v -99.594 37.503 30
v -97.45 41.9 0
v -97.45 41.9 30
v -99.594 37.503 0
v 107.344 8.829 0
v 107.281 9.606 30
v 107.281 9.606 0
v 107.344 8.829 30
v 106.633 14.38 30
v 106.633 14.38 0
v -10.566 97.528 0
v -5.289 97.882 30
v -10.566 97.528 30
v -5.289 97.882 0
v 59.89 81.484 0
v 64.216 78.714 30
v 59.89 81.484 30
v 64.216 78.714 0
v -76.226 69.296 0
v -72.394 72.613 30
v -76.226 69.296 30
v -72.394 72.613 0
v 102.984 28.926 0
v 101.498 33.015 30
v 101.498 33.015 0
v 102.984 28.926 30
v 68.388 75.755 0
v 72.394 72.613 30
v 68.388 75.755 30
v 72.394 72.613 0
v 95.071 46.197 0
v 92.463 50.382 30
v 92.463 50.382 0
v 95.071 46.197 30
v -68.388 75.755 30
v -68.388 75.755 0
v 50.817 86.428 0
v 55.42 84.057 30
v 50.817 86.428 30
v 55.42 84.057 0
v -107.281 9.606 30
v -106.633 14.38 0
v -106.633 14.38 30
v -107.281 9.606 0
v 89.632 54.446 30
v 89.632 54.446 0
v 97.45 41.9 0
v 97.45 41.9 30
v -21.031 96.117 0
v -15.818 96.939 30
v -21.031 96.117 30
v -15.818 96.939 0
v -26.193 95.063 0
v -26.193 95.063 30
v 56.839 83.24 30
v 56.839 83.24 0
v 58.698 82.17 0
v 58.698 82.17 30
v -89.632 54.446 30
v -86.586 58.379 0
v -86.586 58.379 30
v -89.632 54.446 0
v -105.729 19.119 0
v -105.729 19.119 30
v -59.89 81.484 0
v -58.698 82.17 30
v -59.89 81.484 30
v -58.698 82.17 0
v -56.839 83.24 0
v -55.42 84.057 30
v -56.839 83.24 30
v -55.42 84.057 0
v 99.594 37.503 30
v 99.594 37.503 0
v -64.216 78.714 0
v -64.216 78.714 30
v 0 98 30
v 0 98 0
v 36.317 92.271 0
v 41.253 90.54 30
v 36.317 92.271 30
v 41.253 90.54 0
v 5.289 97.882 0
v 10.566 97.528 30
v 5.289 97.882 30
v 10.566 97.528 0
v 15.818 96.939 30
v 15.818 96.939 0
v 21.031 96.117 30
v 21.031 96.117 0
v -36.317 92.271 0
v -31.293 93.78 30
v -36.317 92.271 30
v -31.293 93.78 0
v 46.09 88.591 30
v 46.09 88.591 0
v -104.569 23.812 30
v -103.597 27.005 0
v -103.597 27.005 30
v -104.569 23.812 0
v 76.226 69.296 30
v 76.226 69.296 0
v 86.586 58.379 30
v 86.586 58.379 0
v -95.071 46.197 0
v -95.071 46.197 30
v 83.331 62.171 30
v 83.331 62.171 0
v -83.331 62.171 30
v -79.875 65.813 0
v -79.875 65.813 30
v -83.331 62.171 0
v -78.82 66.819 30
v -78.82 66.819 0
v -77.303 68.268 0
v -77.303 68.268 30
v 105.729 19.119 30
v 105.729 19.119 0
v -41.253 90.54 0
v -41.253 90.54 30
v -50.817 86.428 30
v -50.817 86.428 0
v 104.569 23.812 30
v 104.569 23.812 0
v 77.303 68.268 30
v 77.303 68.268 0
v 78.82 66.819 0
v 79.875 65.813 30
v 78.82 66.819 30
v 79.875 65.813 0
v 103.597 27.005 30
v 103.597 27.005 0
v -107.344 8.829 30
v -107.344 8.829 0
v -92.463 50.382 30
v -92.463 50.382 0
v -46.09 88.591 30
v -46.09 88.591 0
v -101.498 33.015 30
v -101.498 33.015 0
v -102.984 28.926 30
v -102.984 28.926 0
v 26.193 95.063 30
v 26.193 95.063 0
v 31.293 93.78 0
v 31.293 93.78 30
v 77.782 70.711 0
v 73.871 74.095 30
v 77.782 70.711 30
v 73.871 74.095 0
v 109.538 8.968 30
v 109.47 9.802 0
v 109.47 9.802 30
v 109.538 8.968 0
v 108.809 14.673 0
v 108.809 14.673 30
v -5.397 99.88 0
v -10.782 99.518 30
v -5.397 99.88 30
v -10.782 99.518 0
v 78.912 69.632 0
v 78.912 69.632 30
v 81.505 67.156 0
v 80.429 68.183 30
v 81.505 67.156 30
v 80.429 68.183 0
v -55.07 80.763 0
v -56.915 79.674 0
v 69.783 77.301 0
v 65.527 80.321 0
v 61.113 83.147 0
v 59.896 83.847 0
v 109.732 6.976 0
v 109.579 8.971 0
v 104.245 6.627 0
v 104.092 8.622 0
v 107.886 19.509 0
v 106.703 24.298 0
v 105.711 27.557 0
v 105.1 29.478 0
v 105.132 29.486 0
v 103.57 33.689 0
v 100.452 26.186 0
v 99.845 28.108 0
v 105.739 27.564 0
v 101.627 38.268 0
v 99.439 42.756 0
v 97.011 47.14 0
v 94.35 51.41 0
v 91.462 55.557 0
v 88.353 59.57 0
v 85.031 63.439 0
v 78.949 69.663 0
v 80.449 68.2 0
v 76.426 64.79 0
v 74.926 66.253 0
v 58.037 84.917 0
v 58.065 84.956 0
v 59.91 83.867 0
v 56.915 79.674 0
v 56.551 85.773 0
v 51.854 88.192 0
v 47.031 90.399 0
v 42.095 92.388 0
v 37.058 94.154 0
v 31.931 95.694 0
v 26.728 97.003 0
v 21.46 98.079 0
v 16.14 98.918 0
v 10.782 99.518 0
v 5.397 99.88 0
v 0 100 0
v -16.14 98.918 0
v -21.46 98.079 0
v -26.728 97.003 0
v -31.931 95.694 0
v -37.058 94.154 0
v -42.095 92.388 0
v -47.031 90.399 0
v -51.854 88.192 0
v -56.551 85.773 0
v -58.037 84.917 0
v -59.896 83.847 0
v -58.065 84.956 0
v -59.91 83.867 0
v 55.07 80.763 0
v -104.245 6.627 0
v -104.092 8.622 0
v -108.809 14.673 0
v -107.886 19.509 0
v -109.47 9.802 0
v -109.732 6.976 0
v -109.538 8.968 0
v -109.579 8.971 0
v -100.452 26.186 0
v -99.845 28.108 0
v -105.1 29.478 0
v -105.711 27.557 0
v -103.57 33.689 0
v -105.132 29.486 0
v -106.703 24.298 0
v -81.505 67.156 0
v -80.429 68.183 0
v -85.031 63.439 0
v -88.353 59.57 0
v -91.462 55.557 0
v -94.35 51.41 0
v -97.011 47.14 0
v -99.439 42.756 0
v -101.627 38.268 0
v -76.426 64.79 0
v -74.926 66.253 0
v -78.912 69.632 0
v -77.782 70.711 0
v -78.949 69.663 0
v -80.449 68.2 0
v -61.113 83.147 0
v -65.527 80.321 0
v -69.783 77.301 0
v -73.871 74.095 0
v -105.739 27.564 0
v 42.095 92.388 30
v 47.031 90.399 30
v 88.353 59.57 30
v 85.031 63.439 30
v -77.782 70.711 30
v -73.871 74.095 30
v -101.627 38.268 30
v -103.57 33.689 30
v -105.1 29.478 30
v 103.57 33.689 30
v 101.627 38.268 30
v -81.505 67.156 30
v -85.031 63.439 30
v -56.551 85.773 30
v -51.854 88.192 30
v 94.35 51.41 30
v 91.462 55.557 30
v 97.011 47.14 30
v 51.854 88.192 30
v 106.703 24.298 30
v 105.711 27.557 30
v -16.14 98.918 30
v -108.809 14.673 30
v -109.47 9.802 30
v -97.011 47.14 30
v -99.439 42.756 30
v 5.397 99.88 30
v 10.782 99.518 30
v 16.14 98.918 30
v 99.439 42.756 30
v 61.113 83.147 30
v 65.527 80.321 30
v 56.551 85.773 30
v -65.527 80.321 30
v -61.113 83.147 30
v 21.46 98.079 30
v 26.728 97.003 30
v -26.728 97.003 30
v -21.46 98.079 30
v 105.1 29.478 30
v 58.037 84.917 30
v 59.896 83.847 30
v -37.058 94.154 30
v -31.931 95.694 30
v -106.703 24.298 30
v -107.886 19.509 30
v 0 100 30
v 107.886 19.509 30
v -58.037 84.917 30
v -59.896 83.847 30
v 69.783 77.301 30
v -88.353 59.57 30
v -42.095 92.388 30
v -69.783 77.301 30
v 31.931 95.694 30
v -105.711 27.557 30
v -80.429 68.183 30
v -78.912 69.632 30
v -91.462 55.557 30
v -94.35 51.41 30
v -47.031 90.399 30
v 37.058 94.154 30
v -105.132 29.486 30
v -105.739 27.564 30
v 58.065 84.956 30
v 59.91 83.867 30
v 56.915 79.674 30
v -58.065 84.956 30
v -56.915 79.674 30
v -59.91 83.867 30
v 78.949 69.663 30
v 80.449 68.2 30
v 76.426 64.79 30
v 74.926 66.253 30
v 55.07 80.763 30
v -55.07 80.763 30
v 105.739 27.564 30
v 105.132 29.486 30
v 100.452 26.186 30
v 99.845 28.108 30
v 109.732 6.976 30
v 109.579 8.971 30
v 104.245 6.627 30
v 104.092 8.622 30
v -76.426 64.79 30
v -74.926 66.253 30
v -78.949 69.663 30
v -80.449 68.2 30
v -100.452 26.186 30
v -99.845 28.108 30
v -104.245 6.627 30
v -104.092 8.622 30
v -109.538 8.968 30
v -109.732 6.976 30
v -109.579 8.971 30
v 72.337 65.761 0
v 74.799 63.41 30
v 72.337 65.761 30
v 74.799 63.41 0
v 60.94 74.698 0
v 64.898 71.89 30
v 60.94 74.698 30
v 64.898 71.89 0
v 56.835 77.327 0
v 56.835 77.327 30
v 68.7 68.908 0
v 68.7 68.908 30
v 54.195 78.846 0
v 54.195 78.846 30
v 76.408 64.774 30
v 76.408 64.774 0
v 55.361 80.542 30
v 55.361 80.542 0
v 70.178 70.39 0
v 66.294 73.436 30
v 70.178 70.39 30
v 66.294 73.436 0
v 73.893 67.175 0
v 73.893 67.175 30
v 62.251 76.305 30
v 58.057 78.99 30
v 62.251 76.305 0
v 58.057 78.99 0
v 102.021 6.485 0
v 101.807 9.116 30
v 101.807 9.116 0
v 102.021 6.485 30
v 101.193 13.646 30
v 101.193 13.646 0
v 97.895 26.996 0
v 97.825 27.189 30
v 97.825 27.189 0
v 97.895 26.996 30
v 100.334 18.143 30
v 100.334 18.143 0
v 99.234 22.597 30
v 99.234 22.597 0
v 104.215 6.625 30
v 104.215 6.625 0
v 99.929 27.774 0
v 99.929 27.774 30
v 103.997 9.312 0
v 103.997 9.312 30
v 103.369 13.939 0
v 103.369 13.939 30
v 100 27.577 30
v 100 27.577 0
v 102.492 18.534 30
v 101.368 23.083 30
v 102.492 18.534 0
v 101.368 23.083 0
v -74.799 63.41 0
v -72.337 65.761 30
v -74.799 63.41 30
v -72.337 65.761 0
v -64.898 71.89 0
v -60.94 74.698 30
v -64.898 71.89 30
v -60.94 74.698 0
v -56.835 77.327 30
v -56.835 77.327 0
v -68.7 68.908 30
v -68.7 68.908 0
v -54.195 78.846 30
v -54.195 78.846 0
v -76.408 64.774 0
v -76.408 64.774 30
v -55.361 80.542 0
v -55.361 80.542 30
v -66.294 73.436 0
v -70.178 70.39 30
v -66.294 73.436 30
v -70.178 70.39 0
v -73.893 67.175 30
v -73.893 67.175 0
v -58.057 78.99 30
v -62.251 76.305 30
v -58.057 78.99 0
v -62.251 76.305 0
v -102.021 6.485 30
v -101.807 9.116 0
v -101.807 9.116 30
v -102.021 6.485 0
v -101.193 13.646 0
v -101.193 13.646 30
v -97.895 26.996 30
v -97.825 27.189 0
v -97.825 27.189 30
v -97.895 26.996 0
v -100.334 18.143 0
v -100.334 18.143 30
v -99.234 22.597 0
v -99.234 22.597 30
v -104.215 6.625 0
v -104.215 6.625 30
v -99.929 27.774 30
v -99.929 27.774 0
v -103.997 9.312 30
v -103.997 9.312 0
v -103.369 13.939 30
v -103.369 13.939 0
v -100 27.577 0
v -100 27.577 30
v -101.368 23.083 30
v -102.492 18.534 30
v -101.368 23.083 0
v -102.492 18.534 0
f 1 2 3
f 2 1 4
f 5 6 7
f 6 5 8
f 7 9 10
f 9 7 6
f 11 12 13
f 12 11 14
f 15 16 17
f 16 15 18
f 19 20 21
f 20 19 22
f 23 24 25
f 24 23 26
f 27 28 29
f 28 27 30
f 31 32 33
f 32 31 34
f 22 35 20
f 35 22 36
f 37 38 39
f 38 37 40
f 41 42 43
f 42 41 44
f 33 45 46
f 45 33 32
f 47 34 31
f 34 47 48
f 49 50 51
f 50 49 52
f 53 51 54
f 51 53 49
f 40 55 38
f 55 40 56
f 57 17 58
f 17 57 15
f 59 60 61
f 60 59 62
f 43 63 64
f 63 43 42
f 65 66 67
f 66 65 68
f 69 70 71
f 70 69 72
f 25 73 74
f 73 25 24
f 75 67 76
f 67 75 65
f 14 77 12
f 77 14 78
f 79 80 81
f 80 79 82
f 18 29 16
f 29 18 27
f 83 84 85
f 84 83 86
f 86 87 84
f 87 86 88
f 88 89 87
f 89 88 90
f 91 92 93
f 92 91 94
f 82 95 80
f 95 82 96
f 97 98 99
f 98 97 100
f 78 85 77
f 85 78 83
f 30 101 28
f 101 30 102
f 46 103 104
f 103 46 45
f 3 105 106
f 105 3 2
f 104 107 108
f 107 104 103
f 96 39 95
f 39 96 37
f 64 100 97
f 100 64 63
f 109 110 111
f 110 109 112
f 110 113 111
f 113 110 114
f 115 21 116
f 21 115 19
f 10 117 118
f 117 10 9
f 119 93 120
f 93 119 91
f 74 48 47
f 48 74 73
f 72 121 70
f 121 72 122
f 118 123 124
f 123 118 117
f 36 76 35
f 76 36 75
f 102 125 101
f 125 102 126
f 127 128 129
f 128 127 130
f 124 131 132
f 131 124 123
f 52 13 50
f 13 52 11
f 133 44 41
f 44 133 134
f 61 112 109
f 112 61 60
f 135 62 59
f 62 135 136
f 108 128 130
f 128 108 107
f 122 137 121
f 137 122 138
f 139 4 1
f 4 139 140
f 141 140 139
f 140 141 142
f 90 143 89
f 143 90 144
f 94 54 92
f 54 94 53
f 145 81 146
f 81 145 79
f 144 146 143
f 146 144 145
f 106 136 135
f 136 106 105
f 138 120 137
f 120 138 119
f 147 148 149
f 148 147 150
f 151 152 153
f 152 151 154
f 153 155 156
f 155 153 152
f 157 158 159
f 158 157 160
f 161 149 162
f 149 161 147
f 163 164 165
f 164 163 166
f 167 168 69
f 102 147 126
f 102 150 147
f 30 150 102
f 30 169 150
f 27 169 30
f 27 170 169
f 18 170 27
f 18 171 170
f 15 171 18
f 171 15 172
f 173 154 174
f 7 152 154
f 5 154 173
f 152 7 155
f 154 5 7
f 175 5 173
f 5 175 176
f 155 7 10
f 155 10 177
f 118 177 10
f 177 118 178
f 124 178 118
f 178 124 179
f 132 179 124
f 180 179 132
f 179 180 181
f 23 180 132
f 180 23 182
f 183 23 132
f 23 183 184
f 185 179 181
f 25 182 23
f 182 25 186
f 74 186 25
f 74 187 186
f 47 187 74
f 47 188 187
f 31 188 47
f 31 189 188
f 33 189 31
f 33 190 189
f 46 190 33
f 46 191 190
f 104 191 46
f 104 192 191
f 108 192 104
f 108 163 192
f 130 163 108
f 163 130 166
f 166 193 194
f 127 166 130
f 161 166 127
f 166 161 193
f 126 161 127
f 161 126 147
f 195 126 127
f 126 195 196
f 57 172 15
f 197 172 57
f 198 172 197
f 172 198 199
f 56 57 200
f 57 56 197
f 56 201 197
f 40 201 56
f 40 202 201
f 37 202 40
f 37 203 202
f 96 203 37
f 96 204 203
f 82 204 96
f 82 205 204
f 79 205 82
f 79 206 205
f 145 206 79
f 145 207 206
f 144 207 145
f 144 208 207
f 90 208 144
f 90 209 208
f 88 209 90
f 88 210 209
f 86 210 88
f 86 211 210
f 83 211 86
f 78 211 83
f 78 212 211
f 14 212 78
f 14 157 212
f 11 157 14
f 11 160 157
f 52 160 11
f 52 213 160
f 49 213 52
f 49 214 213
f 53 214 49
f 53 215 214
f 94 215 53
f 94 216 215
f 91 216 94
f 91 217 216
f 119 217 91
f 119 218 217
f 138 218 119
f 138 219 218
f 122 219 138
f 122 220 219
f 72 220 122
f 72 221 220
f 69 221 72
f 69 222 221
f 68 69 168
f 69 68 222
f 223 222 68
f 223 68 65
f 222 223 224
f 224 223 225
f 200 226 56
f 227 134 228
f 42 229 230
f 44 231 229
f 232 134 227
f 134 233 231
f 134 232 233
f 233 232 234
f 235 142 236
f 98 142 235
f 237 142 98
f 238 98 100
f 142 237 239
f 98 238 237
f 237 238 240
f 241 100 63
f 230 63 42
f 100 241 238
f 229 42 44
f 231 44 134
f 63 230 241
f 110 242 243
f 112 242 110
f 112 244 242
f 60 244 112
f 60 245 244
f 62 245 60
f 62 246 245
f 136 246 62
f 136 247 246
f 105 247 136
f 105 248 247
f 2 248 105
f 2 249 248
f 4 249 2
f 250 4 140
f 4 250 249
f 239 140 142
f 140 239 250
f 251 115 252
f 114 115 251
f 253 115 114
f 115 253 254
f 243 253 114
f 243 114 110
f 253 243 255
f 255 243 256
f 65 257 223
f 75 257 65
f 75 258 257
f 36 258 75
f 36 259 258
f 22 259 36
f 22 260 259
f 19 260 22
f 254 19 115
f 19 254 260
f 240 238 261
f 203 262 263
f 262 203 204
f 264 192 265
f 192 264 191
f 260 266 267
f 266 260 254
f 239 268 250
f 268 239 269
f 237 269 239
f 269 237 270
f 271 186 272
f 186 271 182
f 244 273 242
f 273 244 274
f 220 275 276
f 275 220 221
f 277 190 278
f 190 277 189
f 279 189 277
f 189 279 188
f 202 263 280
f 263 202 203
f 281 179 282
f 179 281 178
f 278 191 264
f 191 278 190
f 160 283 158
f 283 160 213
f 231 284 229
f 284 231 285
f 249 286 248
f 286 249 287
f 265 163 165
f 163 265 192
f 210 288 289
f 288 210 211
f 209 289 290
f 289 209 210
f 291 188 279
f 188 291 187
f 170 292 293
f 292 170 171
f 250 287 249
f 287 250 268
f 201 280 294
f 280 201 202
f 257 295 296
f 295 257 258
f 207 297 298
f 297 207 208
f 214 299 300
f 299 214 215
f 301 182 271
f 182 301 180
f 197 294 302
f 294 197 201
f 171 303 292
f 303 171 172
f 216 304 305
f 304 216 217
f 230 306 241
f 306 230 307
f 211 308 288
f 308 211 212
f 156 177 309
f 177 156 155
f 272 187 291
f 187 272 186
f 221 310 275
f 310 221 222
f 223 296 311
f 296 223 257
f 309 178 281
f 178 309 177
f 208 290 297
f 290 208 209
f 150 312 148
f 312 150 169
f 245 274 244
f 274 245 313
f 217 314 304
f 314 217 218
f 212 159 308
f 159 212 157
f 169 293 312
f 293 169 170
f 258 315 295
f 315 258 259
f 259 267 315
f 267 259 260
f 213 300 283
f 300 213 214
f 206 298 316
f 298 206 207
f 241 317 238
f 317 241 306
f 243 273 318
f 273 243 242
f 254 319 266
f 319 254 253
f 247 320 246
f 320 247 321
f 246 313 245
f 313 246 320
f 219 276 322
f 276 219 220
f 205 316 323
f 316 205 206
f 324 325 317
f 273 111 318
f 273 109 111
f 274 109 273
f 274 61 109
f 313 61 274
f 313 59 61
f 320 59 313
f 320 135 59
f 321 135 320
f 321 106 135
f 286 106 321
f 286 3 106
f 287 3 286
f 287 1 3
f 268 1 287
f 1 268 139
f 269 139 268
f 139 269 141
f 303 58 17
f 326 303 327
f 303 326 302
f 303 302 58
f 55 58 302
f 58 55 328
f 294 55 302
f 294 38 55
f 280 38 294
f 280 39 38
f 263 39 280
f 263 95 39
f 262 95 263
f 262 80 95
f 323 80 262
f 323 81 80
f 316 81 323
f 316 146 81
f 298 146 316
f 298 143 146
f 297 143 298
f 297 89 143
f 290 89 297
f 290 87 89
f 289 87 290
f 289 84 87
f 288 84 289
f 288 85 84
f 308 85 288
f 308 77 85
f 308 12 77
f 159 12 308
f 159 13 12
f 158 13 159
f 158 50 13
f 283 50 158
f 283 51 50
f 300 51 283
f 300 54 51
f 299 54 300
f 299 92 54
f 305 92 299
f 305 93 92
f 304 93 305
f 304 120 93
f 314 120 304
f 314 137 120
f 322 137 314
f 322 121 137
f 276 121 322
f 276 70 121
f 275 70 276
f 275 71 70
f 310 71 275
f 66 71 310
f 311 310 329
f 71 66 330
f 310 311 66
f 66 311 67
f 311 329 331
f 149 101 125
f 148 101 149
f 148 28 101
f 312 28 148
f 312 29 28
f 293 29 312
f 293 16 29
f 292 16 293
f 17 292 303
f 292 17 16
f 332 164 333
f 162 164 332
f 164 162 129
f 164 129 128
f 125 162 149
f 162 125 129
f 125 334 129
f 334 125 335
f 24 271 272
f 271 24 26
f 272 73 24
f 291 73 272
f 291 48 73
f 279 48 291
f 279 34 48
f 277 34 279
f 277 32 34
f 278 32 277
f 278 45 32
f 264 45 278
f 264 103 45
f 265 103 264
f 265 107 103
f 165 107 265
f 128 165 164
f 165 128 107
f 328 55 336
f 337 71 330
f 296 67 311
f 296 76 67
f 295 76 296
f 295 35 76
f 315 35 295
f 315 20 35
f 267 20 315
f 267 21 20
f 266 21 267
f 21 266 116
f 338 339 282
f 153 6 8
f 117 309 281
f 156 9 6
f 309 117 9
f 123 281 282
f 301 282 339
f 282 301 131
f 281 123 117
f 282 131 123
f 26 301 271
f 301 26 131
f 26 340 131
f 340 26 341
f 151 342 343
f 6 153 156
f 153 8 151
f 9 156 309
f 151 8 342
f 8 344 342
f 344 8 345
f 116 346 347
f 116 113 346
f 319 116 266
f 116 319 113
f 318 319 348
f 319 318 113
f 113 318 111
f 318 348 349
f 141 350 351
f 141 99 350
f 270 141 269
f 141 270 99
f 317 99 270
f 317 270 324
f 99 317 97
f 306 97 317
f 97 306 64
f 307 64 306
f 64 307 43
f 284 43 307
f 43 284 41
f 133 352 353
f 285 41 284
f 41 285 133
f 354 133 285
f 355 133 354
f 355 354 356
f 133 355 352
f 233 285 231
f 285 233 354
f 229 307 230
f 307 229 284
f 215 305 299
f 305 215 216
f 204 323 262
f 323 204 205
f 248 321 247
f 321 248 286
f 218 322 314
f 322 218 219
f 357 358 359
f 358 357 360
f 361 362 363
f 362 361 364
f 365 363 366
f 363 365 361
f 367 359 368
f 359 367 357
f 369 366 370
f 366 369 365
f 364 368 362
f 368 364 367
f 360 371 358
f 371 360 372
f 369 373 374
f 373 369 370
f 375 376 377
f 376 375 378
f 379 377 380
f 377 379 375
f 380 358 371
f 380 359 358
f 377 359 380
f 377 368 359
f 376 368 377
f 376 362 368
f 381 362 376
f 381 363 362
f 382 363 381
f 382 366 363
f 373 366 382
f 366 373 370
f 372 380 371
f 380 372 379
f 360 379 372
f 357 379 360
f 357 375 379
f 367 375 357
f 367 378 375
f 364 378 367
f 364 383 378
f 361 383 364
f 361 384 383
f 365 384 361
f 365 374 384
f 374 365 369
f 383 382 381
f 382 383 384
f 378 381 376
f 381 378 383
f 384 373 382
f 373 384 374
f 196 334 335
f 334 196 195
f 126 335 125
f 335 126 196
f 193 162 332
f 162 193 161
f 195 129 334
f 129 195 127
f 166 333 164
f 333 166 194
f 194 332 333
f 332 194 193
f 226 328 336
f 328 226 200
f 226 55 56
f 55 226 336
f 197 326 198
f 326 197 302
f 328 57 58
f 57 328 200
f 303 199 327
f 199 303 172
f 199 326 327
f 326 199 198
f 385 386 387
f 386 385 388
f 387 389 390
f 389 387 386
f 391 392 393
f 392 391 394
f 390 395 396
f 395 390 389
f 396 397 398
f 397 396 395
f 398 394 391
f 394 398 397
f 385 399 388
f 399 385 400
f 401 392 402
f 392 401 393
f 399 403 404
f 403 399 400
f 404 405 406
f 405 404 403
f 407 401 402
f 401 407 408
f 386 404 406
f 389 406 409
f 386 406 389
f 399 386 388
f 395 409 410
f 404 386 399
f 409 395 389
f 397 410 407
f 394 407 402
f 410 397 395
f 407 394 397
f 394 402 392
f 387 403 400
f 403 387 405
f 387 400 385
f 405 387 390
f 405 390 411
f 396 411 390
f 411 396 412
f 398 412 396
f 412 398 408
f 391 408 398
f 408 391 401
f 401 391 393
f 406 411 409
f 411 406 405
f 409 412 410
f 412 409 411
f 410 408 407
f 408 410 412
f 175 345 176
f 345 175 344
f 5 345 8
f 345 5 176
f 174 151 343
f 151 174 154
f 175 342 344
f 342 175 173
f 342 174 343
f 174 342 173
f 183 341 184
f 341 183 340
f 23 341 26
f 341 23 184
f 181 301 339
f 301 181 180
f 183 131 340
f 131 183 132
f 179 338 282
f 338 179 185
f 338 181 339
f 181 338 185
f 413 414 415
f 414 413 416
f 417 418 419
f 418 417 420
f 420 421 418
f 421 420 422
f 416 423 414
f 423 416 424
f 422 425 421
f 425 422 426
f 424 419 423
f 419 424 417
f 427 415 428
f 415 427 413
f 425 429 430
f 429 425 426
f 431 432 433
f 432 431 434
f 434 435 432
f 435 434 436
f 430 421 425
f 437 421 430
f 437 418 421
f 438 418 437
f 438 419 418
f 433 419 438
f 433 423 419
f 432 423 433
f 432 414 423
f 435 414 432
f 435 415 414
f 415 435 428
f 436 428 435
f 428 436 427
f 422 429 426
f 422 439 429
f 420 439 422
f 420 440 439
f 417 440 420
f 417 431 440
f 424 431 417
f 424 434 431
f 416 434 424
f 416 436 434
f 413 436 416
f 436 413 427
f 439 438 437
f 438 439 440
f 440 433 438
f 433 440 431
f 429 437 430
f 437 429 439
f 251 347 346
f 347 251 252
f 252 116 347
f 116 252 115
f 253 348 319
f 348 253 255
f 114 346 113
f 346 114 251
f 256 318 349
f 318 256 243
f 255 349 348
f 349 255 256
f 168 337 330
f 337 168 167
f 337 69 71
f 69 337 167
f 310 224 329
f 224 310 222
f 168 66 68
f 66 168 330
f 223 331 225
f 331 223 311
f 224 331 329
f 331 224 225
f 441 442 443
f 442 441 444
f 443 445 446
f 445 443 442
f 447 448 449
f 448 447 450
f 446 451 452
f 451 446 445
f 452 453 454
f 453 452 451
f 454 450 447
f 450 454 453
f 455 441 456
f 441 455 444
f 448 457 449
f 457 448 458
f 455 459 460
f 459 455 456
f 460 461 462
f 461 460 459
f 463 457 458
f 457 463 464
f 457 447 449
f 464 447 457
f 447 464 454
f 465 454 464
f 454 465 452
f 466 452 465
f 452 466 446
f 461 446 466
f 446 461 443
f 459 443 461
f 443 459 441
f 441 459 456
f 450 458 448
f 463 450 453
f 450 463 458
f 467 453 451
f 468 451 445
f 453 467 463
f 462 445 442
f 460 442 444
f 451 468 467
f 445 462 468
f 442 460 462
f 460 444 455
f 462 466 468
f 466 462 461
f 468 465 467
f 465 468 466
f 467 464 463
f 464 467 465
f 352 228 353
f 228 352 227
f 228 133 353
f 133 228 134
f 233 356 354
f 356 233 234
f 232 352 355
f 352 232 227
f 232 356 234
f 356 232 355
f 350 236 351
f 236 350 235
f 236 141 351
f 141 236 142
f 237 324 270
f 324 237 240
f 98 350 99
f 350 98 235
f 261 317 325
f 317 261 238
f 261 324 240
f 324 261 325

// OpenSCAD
t=2;

r=100;
$fn=128;

ca=4;
earBand(30);

module earBand(w) {
  scale([1.1,1,1]) difference() {
    cylinder(r=r,h=w);
    translate([0,0,-0.1]) {
      cylinder(r=r-t,h=w+0.2);
      rotate([0,0,ca]) translate([-r,-r,0]) cube([r*2,r,w+0.2]);
      rotate([0,0,-ca]) translate([-r,-r,0]) cube([r*2,r,w+0.2]);
    }
  }

  loop(43,14,w);
  loop(4,12,w);

  mirror([1,0,0]) {
    loop(43,14,w);
    loop(4,12,w);
  }
}

module loop(loopas,loopd,w) {
  loopr=r-5;
  loopae=loopas+loopd;

  scale([1.1,1,1]) {
    difference() {
      cylinder(r=loopr,h=w);
      translate([0,0,-0.1]) {
        cylinder(r=loopr-t,h=w+0.2);
        rotate([0,0,loopas]) translate([-r,-r,0]) cube([r*2,r,w+0.2]);
        rotate([0,0,-179+loopae]) translate([-r,-r,0]) cube([r*2,r,w+0.2]);
      }
    }
    rotate([0,0,loopas]) translate([loopr,0,0]) cube([5,t,w]);
    rotate([0,0,loopae]) translate([loopr,0,0]) cube([5,t,w]);

  }
}
